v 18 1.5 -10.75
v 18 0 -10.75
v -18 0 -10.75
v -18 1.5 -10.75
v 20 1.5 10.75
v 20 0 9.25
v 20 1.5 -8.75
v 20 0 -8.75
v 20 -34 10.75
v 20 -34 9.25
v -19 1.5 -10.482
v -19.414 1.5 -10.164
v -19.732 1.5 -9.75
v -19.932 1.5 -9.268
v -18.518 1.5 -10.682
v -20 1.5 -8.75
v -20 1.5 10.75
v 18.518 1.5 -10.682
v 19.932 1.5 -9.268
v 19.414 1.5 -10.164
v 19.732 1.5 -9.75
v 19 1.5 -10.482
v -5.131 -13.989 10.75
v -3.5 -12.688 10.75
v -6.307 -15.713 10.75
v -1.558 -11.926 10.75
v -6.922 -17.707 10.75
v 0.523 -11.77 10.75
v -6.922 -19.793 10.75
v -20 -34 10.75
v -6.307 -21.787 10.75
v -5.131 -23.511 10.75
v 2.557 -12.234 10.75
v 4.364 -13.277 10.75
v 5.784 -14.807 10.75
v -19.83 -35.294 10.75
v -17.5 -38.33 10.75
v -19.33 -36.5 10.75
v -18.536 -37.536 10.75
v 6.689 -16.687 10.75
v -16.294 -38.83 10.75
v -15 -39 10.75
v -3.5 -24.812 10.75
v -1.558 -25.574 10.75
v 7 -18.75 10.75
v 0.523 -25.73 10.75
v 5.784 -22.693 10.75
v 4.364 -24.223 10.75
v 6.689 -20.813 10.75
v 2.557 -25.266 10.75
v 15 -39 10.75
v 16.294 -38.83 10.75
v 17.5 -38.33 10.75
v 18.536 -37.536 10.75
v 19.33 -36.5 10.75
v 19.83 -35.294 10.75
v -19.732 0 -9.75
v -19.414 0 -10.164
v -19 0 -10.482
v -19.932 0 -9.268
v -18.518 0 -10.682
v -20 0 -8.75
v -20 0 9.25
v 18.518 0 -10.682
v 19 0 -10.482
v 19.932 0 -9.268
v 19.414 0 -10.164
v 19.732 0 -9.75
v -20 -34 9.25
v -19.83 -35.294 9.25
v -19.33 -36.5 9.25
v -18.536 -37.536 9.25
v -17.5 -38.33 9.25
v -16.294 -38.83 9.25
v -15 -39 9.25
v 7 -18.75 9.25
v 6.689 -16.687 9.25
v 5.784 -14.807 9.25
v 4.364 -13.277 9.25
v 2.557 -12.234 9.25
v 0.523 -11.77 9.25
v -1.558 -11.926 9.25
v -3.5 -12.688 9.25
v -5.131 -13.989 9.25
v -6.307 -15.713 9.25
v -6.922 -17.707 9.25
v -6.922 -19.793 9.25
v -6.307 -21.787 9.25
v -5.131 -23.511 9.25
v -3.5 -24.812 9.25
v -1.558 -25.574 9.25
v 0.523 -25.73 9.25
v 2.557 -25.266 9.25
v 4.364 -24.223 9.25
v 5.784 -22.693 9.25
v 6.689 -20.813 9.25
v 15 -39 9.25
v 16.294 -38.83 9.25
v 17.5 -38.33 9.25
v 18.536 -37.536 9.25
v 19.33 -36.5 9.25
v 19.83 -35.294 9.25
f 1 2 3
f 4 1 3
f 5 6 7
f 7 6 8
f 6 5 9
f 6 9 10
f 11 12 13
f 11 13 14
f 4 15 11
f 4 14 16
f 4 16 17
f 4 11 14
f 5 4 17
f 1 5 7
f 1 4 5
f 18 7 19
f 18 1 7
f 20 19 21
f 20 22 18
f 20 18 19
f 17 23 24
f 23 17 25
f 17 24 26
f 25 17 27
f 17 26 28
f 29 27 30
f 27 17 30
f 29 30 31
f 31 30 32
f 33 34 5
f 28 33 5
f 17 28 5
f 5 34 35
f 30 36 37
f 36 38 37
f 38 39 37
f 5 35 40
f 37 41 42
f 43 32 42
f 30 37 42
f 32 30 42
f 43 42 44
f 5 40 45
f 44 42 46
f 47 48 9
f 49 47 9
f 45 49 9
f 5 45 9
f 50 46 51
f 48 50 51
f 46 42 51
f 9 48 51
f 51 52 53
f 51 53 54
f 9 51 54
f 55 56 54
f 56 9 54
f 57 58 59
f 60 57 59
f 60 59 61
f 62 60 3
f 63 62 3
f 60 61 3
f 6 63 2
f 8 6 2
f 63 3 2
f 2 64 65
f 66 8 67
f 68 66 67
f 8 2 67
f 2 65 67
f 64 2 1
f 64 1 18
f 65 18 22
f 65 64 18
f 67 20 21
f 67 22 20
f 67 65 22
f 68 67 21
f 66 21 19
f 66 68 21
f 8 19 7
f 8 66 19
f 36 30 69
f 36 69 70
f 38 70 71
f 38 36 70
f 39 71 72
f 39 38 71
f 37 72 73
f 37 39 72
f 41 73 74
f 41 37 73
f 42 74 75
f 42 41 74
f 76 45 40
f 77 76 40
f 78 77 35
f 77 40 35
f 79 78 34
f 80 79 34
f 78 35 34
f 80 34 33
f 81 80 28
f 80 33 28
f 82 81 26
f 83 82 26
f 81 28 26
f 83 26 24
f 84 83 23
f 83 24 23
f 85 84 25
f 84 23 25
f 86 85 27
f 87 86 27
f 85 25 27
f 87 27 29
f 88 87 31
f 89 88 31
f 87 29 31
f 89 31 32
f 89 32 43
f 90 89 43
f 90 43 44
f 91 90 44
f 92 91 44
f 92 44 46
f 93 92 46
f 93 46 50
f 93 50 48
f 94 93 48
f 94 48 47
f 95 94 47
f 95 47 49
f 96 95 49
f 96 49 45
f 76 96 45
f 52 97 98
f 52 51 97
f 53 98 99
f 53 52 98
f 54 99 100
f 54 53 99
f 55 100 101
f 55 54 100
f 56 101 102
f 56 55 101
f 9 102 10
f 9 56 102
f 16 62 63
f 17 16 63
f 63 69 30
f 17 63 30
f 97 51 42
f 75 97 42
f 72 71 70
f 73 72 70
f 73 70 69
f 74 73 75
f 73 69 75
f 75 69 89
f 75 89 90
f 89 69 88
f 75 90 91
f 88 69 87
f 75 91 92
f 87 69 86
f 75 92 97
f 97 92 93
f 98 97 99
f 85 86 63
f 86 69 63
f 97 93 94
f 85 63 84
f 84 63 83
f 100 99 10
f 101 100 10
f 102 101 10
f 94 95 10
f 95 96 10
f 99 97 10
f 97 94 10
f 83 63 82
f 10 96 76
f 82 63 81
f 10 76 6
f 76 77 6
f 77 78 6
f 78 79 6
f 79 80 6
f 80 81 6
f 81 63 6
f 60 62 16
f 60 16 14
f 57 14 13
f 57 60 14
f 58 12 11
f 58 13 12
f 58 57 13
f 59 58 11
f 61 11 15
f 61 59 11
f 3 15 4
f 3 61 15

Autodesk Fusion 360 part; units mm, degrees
sketch "Sketch1" plane through (0, 0, 0) normal (0, 1, 0) x (1, 0, 0)
  line L0 (18, 10.75) -> (-18, 10.75)
  line L1 (-20, 8.75) -> (-20, -10.75)
  line L2 (-20, -10.75) -> (20, -10.75)
  line L3 (20, -10.75) -> (20, 8.75)
  line L4 (20, 10.75) -> (-20, -10.75) construction
  line L5 (-20, 10.75) -> (20, -10.75) construction
  arc A0 (-18, 10.75) -> (-20, 8.75) centre (-18, 8.75) ccw
  arc A1 (20, 8.75) -> (18, 10.75) centre (18, 8.75) ccw
  dimension "d1" = 40
  dimension "d2" = 21.5
  dimension "d3" = 2
extrude "Extrude1" add sketch "Sketch1" along normal blind 1.5
sketch "Sketch2" plane through (0, 0, 10.75) normal (0, 0, 1) x (1, 0, 0)
  line L0 (-20, 0) -> (20, 0)
  line L1 (20, 0) -> (20, 1.5)
  line L2 (20, 1.5) -> (-20, 1.5)
  line L3 (-20, 1.5) -> (-20, 0)
  line L4 (-20, 1.5) -> (20, 1.5)
  line L5 (20, 1.5) -> (20, -34)
  line L6 (15, -39) -> (-15, -39)
  line L7 (-20, -34) -> (-20, 1.5)
  circle A0 centre (0, -18.75) radius 7
  arc A1 (-20, -34) -> (-15, -39) centre (-15, -34) ccw
  arc A2 (15, -39) -> (20, -34) centre (15, -34) ccw
  point P0 (-20, -39)
  dimension "d7" = 40.5
  dimension "d8" = 14
  dimension "d11" = 5
extrude "Extrude2" add sketch "Sketch2" against normal blind 1.5
